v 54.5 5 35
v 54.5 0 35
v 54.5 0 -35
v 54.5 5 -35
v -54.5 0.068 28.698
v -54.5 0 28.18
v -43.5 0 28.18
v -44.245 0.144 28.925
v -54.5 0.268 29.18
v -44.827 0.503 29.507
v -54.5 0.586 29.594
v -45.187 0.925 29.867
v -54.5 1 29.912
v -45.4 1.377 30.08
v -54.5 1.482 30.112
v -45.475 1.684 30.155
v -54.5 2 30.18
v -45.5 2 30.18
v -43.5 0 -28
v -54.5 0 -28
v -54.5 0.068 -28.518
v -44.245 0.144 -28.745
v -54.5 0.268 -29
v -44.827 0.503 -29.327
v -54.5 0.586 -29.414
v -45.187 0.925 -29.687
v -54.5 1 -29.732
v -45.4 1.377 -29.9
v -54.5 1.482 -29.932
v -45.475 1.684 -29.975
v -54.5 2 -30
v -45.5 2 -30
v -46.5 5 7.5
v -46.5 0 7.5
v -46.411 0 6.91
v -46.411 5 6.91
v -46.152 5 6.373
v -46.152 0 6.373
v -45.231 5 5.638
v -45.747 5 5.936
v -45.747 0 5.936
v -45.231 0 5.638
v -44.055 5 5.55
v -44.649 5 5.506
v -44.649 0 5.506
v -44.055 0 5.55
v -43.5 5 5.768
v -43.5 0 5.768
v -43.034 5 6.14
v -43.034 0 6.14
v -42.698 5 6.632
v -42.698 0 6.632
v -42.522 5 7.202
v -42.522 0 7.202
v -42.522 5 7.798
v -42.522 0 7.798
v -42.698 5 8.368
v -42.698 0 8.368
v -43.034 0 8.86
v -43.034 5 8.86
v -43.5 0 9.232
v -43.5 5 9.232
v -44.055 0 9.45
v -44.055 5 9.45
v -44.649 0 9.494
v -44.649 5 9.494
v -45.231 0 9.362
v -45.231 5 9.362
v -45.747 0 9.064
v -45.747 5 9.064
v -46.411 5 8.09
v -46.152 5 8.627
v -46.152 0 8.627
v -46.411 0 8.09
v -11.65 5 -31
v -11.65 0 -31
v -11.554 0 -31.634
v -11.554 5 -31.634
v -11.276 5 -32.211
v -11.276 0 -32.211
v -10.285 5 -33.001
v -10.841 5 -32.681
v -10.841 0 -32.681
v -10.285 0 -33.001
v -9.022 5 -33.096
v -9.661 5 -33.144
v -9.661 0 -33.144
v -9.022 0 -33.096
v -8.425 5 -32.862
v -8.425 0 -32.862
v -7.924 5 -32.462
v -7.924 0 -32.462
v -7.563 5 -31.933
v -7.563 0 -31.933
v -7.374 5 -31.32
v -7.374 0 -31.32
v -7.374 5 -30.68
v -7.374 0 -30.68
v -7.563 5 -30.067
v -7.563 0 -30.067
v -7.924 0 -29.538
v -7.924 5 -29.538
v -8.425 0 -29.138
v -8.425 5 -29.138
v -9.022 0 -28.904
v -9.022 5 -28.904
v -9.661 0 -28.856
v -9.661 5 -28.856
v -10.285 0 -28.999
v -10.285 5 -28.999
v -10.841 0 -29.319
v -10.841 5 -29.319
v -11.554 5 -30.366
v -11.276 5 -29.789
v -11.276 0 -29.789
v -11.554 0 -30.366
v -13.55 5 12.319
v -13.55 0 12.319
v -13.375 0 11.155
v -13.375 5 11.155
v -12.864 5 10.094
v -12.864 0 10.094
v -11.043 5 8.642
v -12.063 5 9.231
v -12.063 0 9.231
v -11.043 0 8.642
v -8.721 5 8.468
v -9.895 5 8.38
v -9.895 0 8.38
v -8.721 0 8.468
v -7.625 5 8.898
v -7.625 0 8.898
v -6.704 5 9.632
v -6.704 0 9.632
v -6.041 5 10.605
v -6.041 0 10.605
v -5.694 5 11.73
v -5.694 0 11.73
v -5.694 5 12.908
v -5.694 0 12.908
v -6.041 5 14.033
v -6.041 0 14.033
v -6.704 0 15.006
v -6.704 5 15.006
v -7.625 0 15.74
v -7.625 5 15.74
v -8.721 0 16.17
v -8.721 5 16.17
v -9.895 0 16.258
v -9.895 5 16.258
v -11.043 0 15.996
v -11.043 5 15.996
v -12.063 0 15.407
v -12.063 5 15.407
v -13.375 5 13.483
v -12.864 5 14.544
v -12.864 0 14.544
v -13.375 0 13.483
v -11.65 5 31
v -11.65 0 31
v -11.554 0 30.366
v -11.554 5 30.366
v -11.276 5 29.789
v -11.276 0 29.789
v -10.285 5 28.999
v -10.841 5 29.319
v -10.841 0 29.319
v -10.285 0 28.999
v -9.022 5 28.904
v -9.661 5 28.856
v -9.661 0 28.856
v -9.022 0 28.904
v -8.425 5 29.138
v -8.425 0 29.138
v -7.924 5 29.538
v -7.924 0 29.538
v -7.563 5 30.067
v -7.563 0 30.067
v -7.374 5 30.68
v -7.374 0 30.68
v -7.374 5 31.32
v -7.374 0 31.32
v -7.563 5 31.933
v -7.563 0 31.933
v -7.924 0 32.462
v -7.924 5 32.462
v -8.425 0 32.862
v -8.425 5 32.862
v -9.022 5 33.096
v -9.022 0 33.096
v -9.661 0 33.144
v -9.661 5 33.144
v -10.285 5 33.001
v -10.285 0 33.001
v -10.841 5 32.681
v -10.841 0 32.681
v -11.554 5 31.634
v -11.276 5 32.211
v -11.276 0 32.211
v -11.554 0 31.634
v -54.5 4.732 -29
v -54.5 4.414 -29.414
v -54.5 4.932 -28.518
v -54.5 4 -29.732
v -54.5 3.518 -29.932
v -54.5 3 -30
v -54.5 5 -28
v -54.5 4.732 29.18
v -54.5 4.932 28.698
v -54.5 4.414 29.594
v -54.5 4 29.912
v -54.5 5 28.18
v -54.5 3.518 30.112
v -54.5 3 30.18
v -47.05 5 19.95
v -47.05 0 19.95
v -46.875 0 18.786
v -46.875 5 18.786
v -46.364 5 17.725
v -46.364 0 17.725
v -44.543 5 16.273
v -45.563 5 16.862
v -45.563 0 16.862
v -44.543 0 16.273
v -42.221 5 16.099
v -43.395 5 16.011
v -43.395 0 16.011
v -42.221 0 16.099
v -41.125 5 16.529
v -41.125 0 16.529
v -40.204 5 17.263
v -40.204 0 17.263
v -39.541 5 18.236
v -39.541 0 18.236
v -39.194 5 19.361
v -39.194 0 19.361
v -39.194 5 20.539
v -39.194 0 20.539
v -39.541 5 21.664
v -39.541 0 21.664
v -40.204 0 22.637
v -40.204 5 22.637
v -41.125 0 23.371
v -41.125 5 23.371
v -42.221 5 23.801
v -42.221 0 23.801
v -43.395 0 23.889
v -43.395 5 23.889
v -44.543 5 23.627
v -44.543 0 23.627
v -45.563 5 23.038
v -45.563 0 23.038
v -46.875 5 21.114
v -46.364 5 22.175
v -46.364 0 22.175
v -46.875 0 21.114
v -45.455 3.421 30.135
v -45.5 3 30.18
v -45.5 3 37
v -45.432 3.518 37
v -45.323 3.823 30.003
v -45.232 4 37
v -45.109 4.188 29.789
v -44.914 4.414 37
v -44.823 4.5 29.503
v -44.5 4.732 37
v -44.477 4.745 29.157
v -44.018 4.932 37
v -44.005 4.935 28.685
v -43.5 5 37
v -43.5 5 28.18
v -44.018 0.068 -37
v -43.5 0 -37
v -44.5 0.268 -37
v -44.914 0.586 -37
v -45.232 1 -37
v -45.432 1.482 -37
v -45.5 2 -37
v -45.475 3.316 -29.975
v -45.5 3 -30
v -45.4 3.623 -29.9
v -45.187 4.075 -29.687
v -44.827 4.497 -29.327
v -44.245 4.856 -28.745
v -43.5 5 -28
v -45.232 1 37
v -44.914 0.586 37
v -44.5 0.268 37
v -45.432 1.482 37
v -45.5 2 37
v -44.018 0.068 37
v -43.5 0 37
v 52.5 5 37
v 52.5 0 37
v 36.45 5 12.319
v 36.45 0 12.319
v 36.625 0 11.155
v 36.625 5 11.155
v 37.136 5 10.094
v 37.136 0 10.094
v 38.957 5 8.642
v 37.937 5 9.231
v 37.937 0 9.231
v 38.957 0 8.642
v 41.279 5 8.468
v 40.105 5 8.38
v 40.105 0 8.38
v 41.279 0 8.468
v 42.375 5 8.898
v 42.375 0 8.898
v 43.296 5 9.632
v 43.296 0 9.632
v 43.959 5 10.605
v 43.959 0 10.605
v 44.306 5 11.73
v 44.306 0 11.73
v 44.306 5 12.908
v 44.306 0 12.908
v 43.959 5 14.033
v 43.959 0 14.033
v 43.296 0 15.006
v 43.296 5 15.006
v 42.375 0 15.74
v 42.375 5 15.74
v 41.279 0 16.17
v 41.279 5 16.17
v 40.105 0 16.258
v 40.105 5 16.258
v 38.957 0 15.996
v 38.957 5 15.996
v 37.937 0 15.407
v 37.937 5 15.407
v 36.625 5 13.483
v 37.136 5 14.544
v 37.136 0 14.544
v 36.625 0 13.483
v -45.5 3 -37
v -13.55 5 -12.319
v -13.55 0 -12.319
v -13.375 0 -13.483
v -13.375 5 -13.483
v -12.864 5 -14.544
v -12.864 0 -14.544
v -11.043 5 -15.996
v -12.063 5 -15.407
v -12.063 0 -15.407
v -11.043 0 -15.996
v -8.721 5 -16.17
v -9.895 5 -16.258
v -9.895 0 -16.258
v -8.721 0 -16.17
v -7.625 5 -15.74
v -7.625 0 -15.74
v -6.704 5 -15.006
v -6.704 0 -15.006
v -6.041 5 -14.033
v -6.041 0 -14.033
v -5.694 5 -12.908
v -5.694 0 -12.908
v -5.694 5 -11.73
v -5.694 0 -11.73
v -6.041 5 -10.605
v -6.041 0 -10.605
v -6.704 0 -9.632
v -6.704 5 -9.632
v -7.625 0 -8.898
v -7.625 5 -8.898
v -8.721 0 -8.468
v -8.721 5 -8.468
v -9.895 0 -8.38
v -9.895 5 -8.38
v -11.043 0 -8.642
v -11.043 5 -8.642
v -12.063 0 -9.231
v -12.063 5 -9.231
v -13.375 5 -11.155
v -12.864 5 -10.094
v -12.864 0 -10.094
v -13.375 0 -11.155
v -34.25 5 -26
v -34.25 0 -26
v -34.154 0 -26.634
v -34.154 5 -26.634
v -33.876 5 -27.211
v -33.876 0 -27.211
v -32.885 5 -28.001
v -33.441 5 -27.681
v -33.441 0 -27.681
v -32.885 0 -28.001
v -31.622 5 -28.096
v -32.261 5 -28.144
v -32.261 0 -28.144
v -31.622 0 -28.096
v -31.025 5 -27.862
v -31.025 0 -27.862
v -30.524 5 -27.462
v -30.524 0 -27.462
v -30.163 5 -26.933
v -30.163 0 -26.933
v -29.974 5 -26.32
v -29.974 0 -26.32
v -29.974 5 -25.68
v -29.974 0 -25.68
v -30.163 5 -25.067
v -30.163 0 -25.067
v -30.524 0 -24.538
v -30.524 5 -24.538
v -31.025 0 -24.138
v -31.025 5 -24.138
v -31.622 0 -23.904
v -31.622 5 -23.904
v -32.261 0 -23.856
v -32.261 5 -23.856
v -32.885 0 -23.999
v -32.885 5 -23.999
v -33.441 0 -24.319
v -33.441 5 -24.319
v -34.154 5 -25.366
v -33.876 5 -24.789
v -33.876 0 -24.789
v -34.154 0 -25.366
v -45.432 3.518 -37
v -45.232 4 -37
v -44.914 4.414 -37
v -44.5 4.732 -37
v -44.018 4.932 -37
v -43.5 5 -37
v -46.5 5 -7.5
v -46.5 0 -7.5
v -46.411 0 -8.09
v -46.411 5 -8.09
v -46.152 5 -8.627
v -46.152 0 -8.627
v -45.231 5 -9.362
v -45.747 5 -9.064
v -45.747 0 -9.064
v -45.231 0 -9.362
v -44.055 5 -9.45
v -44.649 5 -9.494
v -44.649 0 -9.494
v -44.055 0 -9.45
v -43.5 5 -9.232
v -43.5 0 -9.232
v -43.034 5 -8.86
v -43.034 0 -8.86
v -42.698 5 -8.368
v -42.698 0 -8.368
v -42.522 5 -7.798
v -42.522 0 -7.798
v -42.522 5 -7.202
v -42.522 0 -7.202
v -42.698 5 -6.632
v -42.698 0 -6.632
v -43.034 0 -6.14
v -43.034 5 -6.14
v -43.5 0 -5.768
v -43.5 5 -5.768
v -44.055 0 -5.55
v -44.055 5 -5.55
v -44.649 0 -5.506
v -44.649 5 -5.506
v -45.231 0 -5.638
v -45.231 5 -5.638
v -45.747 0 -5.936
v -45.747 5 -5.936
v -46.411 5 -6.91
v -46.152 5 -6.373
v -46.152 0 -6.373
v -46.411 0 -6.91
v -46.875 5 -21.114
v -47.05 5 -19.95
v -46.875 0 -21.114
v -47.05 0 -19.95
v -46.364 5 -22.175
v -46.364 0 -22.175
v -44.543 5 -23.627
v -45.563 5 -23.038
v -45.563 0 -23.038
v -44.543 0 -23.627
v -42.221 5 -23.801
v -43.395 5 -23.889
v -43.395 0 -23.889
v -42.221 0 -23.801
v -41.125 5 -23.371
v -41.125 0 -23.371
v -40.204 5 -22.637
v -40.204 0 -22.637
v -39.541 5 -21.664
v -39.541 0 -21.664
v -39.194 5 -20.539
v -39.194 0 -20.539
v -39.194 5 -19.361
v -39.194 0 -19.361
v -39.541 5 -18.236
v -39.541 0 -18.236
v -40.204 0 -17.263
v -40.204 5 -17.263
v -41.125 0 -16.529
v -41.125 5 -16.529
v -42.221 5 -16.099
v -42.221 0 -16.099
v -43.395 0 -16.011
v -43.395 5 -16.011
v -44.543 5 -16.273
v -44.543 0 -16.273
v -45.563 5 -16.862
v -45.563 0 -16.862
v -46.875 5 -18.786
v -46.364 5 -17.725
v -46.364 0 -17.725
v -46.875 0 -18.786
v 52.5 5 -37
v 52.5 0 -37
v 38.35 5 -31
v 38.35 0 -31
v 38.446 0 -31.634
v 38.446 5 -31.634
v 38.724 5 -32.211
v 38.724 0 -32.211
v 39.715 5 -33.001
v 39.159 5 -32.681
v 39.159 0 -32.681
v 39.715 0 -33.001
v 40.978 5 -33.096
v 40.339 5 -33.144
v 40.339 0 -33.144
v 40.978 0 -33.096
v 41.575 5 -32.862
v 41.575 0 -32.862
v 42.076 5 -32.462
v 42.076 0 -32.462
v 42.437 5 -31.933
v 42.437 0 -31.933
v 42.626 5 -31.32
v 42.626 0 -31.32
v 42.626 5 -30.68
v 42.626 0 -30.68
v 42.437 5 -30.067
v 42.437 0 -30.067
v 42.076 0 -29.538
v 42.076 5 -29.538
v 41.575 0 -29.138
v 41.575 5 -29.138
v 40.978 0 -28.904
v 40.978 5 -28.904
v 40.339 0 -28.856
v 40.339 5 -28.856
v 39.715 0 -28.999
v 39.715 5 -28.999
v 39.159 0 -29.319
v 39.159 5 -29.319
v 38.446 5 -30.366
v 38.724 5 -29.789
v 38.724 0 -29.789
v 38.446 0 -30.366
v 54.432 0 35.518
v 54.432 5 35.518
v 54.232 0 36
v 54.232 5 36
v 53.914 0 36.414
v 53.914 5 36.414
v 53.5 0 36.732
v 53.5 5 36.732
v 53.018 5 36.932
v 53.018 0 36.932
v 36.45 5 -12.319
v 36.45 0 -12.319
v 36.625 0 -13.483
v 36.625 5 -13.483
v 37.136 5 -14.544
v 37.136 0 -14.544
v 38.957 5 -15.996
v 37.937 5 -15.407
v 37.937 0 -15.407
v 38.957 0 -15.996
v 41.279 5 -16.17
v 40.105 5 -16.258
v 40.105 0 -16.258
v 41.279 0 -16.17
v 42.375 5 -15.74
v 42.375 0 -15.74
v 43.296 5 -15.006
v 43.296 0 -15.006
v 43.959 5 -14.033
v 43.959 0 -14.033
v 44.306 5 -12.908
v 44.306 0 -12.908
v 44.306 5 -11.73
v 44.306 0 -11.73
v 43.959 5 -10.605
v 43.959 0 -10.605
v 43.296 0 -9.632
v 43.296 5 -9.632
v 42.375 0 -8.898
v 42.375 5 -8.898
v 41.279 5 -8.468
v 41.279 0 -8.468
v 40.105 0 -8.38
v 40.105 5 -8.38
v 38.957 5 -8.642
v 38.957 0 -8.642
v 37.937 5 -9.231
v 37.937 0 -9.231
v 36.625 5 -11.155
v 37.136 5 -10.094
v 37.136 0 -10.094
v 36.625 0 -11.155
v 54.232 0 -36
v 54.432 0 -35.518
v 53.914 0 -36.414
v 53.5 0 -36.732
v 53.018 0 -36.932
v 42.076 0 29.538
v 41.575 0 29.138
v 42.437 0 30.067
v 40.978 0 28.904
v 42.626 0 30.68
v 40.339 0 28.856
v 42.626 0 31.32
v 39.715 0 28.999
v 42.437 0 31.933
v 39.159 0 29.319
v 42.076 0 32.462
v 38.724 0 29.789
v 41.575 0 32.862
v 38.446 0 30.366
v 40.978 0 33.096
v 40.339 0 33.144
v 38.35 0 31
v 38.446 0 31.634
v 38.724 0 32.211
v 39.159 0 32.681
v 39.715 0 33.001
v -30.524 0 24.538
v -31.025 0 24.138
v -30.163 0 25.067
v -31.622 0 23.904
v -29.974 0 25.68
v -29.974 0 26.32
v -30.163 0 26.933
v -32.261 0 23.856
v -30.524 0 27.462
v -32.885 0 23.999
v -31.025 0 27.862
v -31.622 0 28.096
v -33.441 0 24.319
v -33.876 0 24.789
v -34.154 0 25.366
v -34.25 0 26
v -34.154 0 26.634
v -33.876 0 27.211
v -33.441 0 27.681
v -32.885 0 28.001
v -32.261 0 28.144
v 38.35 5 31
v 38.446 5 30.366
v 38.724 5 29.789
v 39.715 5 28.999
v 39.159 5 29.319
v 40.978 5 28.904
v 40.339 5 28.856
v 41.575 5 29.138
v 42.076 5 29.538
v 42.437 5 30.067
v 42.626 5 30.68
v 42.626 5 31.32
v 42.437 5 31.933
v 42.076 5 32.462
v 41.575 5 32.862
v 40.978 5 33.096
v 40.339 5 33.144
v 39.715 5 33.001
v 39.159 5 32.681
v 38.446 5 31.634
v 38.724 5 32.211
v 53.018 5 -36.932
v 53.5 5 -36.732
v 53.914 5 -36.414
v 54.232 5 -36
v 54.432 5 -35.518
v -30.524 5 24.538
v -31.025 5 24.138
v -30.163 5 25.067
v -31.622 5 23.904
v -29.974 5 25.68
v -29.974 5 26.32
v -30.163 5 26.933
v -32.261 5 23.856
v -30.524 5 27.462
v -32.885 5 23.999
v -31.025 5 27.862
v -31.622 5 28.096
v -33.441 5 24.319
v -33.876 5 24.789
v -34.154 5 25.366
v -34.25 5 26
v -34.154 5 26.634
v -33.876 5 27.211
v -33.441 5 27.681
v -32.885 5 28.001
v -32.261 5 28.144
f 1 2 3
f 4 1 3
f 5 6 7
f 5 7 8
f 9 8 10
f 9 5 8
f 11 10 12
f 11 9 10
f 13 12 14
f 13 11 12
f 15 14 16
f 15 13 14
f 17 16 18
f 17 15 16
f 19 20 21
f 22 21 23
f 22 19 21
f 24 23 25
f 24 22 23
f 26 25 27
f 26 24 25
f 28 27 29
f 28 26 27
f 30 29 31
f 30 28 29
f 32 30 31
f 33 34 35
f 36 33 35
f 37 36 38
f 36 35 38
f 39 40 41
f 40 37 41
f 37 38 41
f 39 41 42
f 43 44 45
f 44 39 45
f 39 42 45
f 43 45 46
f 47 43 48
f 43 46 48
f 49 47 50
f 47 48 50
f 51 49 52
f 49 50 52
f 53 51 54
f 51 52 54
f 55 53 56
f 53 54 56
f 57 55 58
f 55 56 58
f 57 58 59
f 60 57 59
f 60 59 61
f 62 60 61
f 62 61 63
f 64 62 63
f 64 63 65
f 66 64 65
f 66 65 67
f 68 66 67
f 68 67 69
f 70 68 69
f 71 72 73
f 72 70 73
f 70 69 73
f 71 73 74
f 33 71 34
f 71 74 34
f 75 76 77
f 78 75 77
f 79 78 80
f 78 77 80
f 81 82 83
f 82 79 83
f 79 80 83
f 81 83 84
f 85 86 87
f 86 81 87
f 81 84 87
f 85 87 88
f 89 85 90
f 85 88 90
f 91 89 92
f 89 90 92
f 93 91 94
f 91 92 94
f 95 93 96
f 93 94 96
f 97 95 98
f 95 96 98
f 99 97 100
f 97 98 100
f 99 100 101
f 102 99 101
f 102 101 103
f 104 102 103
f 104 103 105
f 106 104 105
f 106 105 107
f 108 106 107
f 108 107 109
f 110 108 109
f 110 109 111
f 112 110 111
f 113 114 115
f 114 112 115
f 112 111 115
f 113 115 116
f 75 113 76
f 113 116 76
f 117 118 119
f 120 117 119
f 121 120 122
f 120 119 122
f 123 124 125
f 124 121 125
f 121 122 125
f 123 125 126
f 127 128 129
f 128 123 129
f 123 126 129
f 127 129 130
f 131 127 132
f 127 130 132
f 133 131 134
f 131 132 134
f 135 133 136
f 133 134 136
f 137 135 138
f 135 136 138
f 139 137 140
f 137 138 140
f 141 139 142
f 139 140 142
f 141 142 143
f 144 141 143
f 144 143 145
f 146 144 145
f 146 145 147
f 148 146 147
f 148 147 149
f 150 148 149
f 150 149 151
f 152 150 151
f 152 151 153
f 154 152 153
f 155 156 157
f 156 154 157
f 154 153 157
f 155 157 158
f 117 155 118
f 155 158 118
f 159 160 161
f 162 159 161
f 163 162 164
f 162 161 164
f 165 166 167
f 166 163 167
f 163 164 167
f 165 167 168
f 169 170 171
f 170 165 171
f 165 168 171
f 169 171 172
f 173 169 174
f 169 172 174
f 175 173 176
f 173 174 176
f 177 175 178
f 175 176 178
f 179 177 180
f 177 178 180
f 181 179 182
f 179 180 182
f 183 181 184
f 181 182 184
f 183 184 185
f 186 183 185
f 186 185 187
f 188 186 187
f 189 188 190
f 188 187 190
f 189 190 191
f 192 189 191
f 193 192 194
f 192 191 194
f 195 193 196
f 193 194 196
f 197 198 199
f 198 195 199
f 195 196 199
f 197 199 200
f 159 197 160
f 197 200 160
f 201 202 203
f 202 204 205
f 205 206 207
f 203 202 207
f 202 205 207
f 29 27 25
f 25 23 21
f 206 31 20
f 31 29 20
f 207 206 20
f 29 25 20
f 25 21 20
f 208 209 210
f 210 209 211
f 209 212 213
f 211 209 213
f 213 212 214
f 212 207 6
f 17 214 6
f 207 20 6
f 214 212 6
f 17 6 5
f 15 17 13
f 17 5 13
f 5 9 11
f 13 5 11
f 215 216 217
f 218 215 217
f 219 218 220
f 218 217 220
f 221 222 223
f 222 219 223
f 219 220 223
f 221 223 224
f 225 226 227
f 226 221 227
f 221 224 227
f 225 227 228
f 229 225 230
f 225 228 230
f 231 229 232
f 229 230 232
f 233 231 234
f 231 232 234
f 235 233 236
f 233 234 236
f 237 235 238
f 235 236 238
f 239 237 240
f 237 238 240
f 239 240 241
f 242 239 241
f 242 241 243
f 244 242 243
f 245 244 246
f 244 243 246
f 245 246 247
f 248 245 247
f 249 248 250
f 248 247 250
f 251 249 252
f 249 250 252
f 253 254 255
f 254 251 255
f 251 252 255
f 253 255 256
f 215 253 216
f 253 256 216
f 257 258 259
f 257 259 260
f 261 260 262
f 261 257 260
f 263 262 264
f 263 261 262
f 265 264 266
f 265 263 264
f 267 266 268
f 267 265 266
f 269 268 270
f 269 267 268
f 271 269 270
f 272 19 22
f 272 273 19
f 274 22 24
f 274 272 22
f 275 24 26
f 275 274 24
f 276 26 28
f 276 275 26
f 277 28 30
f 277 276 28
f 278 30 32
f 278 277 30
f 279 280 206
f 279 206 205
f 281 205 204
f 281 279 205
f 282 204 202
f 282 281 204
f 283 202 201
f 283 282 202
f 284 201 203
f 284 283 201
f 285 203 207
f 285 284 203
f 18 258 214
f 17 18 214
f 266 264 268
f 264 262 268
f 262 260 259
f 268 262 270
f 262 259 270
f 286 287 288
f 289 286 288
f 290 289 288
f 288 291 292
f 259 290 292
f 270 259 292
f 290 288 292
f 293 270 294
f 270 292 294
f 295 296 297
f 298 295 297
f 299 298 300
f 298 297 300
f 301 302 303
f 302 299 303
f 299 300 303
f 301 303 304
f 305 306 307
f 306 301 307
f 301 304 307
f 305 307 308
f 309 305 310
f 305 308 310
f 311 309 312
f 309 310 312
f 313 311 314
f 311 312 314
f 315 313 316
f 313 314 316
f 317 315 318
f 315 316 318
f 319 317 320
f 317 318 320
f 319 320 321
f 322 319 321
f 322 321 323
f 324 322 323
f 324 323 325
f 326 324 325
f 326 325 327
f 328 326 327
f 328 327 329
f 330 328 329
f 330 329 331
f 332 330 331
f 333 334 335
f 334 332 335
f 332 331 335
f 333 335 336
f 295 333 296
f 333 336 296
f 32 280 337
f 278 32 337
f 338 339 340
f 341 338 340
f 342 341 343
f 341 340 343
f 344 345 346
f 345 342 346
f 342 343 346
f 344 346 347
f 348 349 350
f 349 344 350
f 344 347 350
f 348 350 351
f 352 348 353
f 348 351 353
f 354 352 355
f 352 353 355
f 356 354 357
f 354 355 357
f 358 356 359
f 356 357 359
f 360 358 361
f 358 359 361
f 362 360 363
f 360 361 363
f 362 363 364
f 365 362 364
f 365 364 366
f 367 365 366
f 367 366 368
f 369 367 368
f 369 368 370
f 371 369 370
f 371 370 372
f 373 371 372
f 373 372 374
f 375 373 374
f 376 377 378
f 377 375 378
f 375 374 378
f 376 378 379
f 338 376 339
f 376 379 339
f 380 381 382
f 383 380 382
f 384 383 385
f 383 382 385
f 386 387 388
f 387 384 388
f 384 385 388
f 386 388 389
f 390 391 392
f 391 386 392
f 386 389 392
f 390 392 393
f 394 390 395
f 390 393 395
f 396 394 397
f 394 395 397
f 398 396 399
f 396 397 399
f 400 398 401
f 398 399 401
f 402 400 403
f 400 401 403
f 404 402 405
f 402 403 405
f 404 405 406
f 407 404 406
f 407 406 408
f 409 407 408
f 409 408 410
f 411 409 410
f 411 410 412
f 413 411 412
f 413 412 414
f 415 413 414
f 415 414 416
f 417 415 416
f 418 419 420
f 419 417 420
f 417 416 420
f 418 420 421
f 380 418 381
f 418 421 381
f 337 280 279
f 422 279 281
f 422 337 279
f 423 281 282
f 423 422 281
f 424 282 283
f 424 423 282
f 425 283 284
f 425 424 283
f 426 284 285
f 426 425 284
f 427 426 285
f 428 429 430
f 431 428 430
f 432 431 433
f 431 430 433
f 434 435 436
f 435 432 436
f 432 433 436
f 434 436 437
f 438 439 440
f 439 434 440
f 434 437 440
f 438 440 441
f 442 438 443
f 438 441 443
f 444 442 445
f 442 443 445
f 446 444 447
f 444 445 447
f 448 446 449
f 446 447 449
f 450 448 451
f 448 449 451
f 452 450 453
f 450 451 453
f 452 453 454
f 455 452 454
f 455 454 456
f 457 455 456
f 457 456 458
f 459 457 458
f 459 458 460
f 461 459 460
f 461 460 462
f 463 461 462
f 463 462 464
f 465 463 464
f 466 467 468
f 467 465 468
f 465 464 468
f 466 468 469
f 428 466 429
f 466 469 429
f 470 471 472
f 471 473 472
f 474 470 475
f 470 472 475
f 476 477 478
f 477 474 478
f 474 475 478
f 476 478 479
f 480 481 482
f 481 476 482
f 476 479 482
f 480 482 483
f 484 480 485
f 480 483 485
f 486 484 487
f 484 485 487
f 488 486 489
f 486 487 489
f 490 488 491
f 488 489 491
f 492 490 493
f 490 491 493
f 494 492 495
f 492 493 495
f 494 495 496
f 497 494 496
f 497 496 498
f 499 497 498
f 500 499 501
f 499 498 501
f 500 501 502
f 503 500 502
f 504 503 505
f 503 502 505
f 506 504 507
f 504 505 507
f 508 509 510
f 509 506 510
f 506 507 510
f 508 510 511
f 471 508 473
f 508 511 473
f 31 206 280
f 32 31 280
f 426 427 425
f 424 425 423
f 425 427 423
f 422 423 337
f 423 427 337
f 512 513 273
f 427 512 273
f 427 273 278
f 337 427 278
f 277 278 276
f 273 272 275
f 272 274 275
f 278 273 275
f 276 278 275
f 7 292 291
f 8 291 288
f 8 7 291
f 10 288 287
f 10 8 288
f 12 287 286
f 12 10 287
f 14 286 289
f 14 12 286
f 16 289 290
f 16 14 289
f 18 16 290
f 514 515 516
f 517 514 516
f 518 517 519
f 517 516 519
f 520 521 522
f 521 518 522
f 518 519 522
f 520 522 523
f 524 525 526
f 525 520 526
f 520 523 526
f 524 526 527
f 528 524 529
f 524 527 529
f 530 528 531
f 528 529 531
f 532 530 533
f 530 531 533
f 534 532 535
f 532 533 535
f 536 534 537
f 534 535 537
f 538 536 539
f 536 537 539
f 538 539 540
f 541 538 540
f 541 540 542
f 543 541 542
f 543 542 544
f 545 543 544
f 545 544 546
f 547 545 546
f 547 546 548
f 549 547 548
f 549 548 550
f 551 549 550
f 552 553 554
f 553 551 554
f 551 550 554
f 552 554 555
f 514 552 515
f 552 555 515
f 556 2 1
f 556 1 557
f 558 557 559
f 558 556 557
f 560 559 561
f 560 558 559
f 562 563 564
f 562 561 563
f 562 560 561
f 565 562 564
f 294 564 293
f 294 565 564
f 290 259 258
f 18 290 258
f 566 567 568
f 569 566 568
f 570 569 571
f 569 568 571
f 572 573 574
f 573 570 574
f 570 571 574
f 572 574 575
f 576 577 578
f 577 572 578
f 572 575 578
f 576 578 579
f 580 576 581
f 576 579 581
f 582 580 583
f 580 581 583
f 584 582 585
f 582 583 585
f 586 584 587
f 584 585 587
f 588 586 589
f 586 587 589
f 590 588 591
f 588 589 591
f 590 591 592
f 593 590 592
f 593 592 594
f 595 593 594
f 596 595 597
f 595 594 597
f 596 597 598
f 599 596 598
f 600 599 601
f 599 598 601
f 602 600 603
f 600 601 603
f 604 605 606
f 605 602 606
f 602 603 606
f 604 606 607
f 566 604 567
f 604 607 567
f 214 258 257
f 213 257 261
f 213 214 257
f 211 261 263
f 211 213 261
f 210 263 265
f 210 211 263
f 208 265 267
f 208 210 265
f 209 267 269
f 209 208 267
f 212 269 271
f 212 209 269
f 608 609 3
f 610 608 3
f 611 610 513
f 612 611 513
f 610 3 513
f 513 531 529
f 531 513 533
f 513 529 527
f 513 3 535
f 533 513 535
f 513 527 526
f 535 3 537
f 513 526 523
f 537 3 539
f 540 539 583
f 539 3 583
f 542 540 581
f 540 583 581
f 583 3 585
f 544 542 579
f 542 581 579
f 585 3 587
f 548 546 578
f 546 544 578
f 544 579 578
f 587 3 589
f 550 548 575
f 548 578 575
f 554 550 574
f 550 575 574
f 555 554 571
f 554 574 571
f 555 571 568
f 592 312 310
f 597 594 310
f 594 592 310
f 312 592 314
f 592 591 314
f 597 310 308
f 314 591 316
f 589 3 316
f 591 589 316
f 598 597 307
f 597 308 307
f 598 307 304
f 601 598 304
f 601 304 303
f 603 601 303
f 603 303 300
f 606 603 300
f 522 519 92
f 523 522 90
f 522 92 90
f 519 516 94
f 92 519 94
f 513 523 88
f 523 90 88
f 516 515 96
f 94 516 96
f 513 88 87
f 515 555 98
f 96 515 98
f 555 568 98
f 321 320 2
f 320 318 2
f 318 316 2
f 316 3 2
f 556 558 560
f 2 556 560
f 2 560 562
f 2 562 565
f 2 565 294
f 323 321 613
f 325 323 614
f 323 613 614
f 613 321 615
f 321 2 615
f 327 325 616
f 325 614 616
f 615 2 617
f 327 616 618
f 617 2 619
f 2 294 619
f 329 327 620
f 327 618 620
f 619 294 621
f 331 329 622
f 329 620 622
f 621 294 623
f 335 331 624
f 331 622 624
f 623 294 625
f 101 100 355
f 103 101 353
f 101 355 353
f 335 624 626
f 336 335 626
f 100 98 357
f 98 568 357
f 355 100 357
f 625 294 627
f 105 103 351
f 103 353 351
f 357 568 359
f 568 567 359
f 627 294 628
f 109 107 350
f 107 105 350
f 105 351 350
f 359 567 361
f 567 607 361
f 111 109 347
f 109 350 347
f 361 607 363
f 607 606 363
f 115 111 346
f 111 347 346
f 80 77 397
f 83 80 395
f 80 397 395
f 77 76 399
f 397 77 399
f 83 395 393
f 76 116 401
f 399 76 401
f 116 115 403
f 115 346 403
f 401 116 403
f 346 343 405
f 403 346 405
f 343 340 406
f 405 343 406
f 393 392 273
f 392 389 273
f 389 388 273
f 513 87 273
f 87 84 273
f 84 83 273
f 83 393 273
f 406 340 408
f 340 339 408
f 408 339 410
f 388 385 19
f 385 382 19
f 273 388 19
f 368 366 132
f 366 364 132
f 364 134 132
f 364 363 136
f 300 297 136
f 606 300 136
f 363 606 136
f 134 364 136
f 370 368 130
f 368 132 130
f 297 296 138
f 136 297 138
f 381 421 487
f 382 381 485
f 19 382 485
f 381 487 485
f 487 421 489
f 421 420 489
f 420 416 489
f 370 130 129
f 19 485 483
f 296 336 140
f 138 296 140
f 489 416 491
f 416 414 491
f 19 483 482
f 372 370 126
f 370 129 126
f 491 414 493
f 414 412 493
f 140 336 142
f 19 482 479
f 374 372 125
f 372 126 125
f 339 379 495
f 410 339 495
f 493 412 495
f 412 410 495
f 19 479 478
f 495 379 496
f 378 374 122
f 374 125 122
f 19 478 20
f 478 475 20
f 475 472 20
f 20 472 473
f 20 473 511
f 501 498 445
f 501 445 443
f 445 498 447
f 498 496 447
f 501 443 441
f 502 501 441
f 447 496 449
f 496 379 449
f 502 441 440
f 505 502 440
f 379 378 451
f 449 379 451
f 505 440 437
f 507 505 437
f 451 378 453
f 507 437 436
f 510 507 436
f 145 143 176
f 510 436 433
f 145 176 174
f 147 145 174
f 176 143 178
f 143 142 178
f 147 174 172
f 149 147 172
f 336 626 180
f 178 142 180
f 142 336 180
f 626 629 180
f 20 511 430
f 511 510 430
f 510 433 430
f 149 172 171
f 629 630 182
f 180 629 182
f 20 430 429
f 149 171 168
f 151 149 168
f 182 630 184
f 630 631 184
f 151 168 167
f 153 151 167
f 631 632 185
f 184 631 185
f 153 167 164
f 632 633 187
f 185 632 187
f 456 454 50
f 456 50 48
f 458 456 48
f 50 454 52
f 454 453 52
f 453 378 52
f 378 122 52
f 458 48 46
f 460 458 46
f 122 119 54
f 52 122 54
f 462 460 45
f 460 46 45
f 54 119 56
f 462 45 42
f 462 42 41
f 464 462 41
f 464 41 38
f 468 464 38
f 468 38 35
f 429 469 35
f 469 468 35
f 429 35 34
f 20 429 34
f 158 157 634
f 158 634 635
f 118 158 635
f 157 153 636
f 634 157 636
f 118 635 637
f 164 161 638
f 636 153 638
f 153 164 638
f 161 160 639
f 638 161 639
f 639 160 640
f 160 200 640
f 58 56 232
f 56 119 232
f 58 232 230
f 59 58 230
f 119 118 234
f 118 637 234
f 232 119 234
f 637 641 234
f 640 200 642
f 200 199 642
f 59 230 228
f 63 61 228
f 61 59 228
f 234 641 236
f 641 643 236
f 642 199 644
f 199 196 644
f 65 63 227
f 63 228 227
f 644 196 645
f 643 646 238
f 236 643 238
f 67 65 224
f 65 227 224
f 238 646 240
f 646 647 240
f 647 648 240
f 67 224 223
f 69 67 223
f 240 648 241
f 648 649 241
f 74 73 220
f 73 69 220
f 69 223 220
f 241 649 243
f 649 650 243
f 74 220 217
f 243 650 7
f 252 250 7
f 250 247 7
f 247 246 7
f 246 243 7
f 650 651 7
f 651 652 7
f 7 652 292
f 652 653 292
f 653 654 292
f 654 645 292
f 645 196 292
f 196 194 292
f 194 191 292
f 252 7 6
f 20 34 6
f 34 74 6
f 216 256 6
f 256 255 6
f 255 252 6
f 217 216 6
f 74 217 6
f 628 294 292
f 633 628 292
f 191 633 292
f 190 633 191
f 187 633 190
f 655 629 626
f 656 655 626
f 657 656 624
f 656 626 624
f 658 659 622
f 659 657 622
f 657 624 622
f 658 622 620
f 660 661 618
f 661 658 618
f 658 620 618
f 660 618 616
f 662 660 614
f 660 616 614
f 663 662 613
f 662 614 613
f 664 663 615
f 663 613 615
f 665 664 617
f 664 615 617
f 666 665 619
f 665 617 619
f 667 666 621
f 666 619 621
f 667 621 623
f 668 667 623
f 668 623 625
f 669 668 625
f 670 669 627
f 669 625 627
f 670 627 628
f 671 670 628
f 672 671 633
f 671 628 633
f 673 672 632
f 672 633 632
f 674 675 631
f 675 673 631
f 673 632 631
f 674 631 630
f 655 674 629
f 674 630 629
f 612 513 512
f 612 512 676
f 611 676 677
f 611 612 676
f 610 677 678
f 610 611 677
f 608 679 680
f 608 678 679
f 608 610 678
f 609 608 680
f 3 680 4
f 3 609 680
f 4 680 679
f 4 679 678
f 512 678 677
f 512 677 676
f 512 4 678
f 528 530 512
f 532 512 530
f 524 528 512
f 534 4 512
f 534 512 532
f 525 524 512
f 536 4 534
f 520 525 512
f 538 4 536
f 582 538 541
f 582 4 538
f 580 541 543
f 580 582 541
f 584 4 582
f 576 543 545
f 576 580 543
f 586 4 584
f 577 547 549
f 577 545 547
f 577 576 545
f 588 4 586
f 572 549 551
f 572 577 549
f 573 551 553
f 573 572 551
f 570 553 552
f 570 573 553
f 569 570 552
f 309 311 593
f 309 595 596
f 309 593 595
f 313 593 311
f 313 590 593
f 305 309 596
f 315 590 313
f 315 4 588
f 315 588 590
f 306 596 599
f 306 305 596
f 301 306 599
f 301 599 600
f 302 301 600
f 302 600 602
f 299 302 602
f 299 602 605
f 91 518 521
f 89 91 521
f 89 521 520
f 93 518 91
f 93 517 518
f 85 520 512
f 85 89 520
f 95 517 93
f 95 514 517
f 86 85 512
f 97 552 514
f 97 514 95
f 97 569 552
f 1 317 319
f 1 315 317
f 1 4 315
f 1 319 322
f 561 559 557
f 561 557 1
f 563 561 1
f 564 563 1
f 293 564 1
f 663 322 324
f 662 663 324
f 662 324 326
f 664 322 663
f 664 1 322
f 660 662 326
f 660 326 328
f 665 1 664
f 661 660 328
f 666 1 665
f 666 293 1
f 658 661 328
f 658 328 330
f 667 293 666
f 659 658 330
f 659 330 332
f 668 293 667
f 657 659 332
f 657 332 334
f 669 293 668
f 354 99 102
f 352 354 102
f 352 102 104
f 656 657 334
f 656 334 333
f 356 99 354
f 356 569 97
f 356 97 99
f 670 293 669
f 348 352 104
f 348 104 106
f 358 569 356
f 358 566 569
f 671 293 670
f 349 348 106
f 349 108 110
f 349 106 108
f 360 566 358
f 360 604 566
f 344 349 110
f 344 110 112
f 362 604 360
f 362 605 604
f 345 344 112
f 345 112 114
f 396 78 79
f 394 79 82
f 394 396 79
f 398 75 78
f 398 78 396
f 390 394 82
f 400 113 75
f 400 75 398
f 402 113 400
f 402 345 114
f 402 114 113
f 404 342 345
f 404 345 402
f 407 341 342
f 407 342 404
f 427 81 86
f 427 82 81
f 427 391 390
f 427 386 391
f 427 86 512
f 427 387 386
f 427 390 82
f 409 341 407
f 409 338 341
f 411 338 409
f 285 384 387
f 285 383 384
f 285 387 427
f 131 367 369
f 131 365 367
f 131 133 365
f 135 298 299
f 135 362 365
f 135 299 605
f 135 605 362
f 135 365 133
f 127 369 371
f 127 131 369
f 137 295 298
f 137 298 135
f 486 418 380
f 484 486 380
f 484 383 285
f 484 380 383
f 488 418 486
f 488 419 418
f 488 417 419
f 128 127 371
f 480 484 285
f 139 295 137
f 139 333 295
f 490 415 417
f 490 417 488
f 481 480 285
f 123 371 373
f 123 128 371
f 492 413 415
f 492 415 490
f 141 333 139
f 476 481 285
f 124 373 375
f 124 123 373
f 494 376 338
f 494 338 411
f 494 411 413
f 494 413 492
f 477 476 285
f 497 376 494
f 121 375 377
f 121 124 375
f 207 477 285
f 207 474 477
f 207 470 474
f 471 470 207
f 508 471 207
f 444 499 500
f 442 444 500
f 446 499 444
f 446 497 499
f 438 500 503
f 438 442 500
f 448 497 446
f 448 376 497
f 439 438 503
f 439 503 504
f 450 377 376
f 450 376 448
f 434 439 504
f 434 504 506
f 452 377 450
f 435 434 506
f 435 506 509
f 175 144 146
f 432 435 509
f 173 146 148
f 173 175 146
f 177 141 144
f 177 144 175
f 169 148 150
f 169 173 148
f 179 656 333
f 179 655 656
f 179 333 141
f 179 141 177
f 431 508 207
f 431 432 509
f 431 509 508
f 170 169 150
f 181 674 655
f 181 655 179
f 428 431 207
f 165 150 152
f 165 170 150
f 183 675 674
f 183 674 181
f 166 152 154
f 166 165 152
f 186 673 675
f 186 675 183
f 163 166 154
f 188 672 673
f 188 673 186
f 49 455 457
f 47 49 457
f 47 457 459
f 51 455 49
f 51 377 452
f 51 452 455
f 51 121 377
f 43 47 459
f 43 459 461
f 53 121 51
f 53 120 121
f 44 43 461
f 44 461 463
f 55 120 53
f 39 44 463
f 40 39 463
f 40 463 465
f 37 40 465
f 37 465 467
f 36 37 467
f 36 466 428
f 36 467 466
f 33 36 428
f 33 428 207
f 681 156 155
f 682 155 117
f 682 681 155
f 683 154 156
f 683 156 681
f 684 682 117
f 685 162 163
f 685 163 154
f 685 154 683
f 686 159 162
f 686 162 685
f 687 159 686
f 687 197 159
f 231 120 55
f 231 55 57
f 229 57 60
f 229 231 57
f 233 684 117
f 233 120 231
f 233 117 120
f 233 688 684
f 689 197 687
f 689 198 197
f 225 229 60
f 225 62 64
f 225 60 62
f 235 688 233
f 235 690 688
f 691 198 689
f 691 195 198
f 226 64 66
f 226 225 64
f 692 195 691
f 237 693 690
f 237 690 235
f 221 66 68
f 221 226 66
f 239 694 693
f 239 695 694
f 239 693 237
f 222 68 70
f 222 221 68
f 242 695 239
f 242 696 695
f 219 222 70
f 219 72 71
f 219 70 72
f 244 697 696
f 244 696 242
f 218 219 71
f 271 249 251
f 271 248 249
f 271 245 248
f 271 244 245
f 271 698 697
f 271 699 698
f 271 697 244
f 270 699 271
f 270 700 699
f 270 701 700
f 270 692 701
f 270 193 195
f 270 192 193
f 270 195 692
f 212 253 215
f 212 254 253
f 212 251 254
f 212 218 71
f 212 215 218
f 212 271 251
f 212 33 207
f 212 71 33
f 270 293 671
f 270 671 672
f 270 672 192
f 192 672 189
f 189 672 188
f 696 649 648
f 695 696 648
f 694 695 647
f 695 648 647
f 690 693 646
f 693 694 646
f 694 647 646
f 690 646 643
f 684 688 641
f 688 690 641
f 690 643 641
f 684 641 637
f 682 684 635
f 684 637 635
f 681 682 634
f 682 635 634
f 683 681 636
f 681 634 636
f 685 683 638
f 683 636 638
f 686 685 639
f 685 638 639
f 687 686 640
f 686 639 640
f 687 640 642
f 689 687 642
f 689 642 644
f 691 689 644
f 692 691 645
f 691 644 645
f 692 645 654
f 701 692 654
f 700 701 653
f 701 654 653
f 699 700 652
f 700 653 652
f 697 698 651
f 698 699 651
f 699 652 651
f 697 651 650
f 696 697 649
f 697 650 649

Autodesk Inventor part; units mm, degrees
ref_plane "YZ Plane" through (0, 0, 0) normal (1, 0, 0) x (0, 1, 0)
ref_plane "XZ Plane" through (0, 0, 0) normal (0, 1, 0) x (-1, 0, 0)
ref_plane "XY Plane" through (0, 0, 0) normal (0, 0, 1) x (1, 0, 0)
sketch "Sketch1" plane through (0, 0, 0) normal (0, 1, 0) x (-1, 0, 0)
  line L0 (52.5, 37) -> (-52.5, 37)
  line L1 (-54.5, 35) -> (-54.5, -35)
  line L2 (-52.5, -37) -> (52.5, -37)
  line L3 (54.5, -35) -> (54.5, 35)
  line L4 (54.5, 37) -> (-54.5, -37) construction
  line L5 (-54.5, 37) -> (54.5, -37) construction
  circle A0 centre (-40.5, -31) radius 2.15
  circle A1 centre (-40.5, 31) radius 2.15
  circle A2 centre (9.5, -31) radius 2.15
  circle A3 centre (9.5, 31) radius 2.15
  circle A4 centre (32.1, 26) radius 2.15
  circle A5 centre (32.1, -26) radius 2.15
  circle A6 centre (9.6, 12.319) radius 3.95
  circle A7 centre (9.6, -12.319) radius 3.95
  circle A8 centre (-40.4, 12.319) radius 3.95
  circle A9 centre (-40.4, -12.319) radius 3.95
  circle A10 centre (43.1, 19.95) radius 3.95
  circle A11 centre (43.1, -19.95) radius 3.95
  arc A12 (54.5, 35) -> (52.5, 37) centre (52.5, 35) ccw
  arc A13 (52.5, -37) -> (54.5, -35) centre (52.5, -35) ccw
  arc A14 (-54.5, -35) -> (-52.5, -37) centre (-52.5, -35) ccw
  arc A15 (-52.5, 37) -> (-54.5, 35) centre (-52.5, 35) ccw
  circle A16 centre (44.5, -7.5) radius 2
  circle A17 centre (44.5, 7.5) radius 2
  point P0 (0, 0)
  dimension "d0" = 109
  dimension "d1" = 74
  dimension "d2" = 4.3
  dimension "d3" = 6
  dimension "d4" = 14
  dimension "d5" = 4.3
  dimension "d6" = 6
  dimension "d7" = 14
  dimension "d8" = 4.3
  dimension "d9" = 6
  dimension "d10" = 64
  dimension "d11" = 4.3
  dimension "d12" = 6
  dimension "d13" = 64
  dimension "d14" = 4.3
  dimension "d20" = 7.9
  dimension "d22" = 7.9
  dimension "d24" = 64.1
  dimension "d25" = 64.1
  dimension "d26" = 7.9
  dimension "d27" = 50
  dimension "d28" = 24.638
  dimension "d29" = 12.319
  dimension "d30" = 12.319
  dimension "d31" = 7.9
  dimension "d32" = 24.638
  dimension "d33" = 50
  dimension "d34" = 7.9
  dimension "d35" = 7.9
  dimension "d36" = 39.9
  dimension "d37" = 19.95
  dimension "d42" = 2
  dimension "d59" = 11
  dimension "d61" = 26
  dimension "d63" = 52
  dimension "d64" = 11
  dimension "d65" = 4.3
  dimension "d66" = 33.5
  dimension "d67" = 33.5
  dimension "d70" = 4
  dimension "d71" = 4
  dimension "d72" = 15
  dimension "d73" = 7.5
  dimension "d74" = 10
  dimension "d75" = 10
extrude "Extrusion5" add sketch "Sketch1" along normal blind 5
thread "Thread1" size "M4x0.7" class "6H" standard "ANSI Metric M Profile" full length
thread "Thread2" size "M4x0.7" class "6H" standard "ANSI Metric M Profile" full length
sketch "Sketch2" plane through (0, 5, 0) normal (0, 1, 0) x (1, 0, 0)
  line L0 (-54.5, 30) -> (-45.5, 30)
  line L1 (-45.5, 30) -> (-45.5, 37)
  line L2 (-54.5, 35) -> (-54.5, -35) projected
  line L3 (52.5, 37) -> (-52.5, 37) projected
  line L4 (-45.5, -37.1799) -> (-45.5, -30.1799)
  line L5 (-45.5, -30.1799) -> (-54.5, -30.1799)
  line L6 (-54.5, 30) -> (-54.5, 37)
  line L7 (-54.5, 37) -> (-45.5, 37)
  line L8 (-45.5, -37.1799) -> (-54.5, -37.1799)
  line L9 (-54.5, -37.1799) -> (-54.5, -30.1799)
  point P0 (0, 0)
  dimension "d84" = 9
  dimension "d85" = 7
  dimension "d86" = 7
extrude "Extrusion7" cut sketch "Sketch2" against normal blind 10
fillet "Fillet1" radius 2 8 edges at (-50, 5, 30.1799) (-45.5, 5, 33.59) (-50, 5, -30) (-45.5, 5, -33.5) (-50, 0, 30.1799) (-45.5, 0, 33.59) (-50, 0, -30) (-45.5, 0, -33.5)
equation "\"d86\" = d85"
properties part number "TopSupport"
